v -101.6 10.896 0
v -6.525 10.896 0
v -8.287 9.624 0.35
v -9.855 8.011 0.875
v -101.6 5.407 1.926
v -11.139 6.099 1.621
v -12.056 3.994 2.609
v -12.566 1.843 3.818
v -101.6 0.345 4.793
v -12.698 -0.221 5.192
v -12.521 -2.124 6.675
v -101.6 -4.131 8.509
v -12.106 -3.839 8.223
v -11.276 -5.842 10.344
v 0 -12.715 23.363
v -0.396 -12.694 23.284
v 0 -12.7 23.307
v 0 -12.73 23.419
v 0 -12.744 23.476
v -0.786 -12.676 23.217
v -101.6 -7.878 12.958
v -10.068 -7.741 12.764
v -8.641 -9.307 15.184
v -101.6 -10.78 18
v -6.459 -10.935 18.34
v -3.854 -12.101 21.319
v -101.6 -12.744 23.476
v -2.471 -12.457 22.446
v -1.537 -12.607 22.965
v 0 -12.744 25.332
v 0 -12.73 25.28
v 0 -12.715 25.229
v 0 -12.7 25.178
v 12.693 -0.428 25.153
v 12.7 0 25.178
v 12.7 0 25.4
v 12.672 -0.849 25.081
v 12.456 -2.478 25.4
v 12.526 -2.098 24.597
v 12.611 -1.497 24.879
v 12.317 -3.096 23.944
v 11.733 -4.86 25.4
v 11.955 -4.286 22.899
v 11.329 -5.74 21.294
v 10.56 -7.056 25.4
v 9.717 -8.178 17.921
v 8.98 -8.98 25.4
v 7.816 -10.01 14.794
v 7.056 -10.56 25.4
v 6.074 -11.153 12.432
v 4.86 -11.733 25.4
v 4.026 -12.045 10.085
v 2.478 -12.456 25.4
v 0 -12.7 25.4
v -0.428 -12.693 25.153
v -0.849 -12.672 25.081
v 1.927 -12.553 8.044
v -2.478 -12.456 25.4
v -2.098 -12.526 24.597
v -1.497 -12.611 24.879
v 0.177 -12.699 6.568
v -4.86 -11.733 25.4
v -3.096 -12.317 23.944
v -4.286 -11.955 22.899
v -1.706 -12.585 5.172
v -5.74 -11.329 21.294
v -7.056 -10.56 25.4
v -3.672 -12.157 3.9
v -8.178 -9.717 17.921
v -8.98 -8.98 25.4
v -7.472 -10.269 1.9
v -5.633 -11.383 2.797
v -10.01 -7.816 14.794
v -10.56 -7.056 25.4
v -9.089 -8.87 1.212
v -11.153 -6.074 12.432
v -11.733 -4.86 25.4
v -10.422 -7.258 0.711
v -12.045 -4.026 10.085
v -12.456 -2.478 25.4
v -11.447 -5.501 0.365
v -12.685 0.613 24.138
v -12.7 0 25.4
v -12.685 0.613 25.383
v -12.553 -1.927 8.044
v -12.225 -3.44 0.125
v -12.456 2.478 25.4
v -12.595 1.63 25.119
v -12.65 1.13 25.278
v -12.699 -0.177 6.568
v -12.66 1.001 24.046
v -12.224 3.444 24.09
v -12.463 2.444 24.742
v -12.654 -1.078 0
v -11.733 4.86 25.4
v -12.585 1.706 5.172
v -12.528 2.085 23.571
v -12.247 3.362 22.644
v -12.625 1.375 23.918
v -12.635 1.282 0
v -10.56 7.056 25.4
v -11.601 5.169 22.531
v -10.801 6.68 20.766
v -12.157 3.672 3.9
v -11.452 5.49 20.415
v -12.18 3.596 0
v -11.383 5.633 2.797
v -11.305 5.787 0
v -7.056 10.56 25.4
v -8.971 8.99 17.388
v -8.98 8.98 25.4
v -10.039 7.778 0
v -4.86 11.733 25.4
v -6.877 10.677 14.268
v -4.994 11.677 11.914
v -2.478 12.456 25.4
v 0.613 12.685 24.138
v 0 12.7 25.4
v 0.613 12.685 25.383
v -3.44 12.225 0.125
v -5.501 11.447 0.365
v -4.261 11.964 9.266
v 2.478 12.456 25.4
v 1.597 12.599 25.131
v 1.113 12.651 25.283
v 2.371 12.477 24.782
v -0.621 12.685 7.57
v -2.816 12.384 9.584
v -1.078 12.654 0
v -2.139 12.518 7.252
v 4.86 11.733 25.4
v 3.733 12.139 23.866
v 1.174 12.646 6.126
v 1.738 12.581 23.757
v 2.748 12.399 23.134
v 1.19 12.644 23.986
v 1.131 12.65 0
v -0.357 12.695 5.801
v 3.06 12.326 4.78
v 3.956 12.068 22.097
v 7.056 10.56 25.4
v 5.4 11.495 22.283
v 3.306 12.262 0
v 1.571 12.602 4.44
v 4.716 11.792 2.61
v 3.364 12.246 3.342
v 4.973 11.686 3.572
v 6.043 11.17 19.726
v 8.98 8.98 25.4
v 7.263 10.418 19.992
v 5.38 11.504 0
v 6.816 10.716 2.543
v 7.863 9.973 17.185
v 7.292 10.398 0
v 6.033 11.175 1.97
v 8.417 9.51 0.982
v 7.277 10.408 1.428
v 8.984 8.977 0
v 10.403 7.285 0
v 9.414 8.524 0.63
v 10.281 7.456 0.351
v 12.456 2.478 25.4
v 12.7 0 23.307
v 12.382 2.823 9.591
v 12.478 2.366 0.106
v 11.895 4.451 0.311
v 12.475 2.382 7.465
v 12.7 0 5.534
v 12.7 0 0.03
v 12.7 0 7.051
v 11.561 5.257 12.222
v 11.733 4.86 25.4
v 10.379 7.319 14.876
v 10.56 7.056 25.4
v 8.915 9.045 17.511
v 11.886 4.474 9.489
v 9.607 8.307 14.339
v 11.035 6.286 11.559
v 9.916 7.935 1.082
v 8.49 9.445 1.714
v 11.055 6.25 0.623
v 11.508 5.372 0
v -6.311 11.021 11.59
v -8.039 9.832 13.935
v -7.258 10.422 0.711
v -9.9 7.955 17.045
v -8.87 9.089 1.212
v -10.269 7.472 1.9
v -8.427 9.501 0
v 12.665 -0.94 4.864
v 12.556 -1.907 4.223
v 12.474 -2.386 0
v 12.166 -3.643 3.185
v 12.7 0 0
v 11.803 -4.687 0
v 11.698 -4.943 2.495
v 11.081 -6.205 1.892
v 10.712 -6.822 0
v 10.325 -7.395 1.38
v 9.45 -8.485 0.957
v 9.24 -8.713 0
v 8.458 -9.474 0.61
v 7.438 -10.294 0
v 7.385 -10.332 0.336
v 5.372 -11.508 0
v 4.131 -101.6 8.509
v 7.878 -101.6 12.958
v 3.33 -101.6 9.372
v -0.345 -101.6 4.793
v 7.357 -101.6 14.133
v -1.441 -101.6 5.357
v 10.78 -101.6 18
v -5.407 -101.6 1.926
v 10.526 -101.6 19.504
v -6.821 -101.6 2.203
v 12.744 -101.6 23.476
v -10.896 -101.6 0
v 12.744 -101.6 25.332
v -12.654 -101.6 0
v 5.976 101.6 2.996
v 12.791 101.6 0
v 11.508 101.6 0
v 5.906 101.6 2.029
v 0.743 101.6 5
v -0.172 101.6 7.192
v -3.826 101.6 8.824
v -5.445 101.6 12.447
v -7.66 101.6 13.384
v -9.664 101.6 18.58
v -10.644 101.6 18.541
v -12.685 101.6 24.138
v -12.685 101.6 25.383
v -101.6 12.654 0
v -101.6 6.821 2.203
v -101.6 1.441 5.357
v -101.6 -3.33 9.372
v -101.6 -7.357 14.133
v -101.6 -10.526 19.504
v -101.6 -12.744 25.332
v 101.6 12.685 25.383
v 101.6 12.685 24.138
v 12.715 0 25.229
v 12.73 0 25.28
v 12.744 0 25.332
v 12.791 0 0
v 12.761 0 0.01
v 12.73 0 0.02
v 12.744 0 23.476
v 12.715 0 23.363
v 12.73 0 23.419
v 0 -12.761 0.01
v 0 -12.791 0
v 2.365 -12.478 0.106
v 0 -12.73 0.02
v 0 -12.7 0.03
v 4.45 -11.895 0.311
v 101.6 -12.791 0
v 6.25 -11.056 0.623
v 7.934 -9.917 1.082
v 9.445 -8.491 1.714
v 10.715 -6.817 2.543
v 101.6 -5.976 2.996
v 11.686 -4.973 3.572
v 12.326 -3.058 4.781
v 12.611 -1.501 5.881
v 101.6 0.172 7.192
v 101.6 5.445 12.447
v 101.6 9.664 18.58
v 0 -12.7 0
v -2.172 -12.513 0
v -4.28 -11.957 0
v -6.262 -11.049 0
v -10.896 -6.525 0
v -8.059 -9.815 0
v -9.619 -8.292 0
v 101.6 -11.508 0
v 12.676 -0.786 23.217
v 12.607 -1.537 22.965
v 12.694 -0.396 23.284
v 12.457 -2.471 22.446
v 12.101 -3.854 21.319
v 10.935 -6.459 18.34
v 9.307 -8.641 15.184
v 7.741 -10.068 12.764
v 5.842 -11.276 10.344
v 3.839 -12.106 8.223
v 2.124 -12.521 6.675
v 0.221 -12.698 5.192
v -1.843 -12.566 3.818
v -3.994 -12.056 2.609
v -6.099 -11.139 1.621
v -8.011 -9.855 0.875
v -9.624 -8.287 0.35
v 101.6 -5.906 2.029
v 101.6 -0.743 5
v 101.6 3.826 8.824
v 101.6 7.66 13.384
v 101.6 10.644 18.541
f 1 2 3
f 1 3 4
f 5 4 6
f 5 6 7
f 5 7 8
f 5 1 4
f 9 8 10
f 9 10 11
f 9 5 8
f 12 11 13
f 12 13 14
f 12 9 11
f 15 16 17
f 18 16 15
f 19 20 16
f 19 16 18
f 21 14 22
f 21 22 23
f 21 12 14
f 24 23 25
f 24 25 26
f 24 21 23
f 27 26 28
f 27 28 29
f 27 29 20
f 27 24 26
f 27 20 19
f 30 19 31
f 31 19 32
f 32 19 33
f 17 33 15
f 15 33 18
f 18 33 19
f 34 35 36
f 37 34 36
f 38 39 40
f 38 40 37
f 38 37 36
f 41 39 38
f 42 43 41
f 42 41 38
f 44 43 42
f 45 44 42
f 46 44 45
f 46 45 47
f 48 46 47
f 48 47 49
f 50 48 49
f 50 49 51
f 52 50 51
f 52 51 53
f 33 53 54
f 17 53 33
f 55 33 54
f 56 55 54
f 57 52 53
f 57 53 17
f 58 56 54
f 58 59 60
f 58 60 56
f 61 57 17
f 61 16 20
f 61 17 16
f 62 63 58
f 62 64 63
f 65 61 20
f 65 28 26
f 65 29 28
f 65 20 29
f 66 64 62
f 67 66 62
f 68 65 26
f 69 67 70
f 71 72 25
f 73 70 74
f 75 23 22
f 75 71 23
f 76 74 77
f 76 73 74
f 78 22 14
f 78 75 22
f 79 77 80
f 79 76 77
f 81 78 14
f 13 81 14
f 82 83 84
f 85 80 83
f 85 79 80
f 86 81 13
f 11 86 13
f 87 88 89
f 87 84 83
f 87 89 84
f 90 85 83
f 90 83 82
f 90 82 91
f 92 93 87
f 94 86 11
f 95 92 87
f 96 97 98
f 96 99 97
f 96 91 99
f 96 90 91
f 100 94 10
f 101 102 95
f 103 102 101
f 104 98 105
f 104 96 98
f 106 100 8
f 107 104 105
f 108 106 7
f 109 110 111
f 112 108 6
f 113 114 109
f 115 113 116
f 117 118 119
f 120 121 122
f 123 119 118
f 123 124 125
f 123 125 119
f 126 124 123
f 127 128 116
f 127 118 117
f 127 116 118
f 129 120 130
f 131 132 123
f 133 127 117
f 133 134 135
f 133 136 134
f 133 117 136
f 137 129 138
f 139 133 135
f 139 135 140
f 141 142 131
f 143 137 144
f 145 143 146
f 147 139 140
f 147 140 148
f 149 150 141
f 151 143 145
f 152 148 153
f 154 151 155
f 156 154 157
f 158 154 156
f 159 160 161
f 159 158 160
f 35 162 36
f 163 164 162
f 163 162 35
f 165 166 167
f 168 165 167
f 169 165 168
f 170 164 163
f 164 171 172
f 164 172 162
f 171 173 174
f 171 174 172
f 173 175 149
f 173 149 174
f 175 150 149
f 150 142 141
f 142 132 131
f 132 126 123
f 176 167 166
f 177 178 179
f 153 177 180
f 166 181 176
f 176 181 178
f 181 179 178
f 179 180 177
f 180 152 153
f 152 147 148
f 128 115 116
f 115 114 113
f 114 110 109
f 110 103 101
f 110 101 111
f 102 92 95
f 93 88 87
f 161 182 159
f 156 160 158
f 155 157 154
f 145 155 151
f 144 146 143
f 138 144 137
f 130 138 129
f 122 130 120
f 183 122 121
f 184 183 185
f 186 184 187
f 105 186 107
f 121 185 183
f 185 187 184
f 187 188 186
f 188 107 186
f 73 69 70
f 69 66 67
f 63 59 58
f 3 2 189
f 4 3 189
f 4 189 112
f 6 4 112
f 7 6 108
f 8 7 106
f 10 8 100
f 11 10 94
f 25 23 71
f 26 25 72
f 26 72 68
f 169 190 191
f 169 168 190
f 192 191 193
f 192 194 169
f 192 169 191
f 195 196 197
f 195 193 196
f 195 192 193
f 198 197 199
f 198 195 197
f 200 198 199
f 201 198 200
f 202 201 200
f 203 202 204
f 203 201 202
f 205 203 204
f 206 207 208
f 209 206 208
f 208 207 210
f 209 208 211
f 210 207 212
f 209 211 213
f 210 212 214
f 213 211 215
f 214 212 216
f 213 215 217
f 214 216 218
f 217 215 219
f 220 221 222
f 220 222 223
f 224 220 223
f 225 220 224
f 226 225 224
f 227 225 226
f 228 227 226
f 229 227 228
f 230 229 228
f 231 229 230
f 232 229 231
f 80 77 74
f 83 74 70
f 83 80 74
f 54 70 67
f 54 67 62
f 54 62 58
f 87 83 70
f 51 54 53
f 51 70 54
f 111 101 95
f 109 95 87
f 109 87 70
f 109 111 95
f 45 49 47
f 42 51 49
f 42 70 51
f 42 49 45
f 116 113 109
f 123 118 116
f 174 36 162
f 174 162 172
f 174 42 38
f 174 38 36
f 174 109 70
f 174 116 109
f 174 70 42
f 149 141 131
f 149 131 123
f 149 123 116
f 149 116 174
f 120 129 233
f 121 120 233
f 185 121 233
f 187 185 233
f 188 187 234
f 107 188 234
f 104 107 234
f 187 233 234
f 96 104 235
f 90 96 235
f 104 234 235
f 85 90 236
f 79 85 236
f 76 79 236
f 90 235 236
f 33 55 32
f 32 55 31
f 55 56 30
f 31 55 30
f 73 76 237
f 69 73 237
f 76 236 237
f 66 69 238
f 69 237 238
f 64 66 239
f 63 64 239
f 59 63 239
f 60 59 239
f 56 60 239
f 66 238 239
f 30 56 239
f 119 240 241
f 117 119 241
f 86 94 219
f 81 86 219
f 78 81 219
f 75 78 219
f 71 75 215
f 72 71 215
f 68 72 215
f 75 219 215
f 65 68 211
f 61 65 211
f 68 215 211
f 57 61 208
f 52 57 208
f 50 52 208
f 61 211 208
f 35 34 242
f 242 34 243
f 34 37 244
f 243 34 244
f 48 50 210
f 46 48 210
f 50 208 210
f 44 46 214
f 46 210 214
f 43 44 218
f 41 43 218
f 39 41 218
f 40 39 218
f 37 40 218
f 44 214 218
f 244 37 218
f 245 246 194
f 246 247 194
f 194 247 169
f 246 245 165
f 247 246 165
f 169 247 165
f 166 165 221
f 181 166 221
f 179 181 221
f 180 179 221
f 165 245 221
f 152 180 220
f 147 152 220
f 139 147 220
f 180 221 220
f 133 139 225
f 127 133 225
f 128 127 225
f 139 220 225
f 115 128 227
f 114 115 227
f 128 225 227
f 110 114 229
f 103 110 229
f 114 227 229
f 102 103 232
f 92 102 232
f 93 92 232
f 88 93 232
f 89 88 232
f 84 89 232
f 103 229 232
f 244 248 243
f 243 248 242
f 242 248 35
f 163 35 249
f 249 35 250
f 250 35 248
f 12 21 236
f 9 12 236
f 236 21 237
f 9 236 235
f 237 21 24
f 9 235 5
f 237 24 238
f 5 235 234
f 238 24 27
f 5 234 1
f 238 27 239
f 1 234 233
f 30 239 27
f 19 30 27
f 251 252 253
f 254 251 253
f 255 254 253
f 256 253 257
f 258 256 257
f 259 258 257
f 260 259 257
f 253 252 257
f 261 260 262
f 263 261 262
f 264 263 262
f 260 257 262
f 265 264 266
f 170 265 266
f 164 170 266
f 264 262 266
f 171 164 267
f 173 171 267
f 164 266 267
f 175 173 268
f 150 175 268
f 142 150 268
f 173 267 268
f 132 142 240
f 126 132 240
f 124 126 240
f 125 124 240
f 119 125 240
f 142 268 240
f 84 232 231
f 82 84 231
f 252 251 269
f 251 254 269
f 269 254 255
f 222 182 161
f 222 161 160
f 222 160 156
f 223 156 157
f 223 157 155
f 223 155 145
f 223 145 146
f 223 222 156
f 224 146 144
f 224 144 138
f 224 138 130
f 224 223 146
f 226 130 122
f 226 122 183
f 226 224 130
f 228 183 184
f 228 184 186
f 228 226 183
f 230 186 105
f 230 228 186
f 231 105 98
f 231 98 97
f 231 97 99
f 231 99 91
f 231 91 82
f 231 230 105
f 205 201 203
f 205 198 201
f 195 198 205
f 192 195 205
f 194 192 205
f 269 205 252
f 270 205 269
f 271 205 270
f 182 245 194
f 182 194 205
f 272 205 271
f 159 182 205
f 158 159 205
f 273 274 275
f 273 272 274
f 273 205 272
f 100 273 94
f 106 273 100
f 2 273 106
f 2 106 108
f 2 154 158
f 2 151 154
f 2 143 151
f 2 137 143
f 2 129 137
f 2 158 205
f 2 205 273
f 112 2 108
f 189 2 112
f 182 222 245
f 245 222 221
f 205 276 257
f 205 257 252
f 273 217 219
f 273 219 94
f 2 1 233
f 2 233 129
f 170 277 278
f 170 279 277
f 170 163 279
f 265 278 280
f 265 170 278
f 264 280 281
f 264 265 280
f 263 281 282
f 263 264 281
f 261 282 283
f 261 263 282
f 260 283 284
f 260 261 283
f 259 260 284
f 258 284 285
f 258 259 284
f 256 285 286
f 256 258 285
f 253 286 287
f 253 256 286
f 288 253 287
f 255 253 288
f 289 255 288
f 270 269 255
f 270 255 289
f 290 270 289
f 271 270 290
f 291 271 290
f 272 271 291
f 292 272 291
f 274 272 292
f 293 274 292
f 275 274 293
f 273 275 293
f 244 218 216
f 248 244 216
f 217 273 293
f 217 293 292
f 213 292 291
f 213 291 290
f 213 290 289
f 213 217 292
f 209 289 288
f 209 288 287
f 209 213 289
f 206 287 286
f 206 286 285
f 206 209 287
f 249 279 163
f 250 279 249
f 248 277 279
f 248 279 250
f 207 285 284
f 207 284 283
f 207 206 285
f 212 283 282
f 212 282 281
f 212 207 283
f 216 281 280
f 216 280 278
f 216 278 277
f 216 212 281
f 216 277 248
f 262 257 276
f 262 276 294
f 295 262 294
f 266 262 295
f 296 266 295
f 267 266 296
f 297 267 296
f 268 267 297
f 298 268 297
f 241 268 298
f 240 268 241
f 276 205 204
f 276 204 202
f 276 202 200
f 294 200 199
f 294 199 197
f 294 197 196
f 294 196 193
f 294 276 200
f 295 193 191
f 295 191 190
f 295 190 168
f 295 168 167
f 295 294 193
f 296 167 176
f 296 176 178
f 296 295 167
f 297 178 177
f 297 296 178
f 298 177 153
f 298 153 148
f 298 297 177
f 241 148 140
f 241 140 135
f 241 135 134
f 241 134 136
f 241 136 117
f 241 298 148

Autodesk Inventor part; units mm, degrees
sketch "Sketch1" plane through (0, 0, 0) normal (0, 0, 1) x (1, 0, 0)
  circle A0 centre (0, 0) radius 12.7
  dimension "d0" = 25.4
extrude "Extrusion1" add sketch "Sketch1" along normal blind 25.4
ref_plane "Work Plane1" through (101.6, 0, 0) normal (1, 0, 0) x (0, 1, 0)
sketch "Sketch2" plane through (101.6, 0, 0) normal (1, 0, 0) x (0, 1, 0)
  arc A0 (-11.5079, 0) -> (12.6852, 24.1379) centre (-20.2903, 32.9957) ccw
  arc A1 (-12.7911, 0) -> (12.6852, 25.3834) centre (-25.5599, 38.2921) ccw
  line L0 (12.6852, 25.3834) -> (12.6852, 24.1379)
  line L1 (-12.7911, 0) -> (-11.5079, 0)
  point P0 (0, 0)
extrude "Extrusion2" add sketch "Sketch2" against normal blind 101.6
ref_plane "Work Plane2" through (0, -101.6, 0) normal (0, 1, 0) x (-1, 0, 0)
sketch "Sketch3" plane through (0, -101.6, 0) normal (0, 1, 0) x (-1, 0, 0)
  arc A0 (-12.7444, 23.4755) -> (10.8958, 0) centre (18.9573, 31.7588) ccw
  arc A1 (-12.7444, 25.3315) -> (12.6542, 0) centre (22.7301, 35.5012) ccw
  line L0 (-12.7444, 25.3315) -> (-12.7444, 23.4755)
  line L1 (12.6542, 0) -> (10.8958, 0)
  point P0 (0, 0)
  dimension "d7" = 32.766
extrude "Extrusion3" add sketch "Sketch3" along normal blind 101.6
ref_plane "Work Plane3" through (-101.6, 0, 0) normal (1, 0, 0) x (0, 1, 0)
sketch "Sketch4" plane through (-101.6, 0, 0) normal (1, 0, 0) x (0, 1, 0)
  arc A0 (-12.7444, 23.4755) -> (10.8958, 0) centre (18.9573, 31.7588) ccw
  arc A1 (-12.7444, 25.3315) -> (12.6542, 0) centre (22.7301, 35.5012) ccw
  line L0 (-12.7444, 25.3315) -> (-12.7444, 23.4755)
  line L1 (12.6542, 0) -> (10.8958, 0)
  point P0 (0, 0)
  point P1 (0, 0)
  dimension "d11" = 32.766
extrude "Extrusion4" add sketch "Sketch4" along normal blind 101.6
ref_plane "Work Plane4" through (0, 101.6, 0) normal (0, 1, 0) x (-1, 0, 0)
sketch "Sketch5" plane through (0, 101.6, 0) normal (0, 1, 0) x (-1, 0, 0)
  arc A0 (-11.5079, 0) -> (12.6852, 24.1379) centre (-20.2903, 32.9957) ccw
  arc A1 (-12.7911, 0) -> (12.6852, 25.3834) centre (-25.5599, 38.2921) ccw
  line L0 (12.6852, 25.3834) -> (12.6852, 24.1379)
  line L1 (-12.7911, 0) -> (-11.5079, 0)
  point P0 (0, 0)
  point P1 (0, 0)
extrude "Extrusion5" add sketch "Sketch5" against normal blind 101.6
properties part number "Fan"
